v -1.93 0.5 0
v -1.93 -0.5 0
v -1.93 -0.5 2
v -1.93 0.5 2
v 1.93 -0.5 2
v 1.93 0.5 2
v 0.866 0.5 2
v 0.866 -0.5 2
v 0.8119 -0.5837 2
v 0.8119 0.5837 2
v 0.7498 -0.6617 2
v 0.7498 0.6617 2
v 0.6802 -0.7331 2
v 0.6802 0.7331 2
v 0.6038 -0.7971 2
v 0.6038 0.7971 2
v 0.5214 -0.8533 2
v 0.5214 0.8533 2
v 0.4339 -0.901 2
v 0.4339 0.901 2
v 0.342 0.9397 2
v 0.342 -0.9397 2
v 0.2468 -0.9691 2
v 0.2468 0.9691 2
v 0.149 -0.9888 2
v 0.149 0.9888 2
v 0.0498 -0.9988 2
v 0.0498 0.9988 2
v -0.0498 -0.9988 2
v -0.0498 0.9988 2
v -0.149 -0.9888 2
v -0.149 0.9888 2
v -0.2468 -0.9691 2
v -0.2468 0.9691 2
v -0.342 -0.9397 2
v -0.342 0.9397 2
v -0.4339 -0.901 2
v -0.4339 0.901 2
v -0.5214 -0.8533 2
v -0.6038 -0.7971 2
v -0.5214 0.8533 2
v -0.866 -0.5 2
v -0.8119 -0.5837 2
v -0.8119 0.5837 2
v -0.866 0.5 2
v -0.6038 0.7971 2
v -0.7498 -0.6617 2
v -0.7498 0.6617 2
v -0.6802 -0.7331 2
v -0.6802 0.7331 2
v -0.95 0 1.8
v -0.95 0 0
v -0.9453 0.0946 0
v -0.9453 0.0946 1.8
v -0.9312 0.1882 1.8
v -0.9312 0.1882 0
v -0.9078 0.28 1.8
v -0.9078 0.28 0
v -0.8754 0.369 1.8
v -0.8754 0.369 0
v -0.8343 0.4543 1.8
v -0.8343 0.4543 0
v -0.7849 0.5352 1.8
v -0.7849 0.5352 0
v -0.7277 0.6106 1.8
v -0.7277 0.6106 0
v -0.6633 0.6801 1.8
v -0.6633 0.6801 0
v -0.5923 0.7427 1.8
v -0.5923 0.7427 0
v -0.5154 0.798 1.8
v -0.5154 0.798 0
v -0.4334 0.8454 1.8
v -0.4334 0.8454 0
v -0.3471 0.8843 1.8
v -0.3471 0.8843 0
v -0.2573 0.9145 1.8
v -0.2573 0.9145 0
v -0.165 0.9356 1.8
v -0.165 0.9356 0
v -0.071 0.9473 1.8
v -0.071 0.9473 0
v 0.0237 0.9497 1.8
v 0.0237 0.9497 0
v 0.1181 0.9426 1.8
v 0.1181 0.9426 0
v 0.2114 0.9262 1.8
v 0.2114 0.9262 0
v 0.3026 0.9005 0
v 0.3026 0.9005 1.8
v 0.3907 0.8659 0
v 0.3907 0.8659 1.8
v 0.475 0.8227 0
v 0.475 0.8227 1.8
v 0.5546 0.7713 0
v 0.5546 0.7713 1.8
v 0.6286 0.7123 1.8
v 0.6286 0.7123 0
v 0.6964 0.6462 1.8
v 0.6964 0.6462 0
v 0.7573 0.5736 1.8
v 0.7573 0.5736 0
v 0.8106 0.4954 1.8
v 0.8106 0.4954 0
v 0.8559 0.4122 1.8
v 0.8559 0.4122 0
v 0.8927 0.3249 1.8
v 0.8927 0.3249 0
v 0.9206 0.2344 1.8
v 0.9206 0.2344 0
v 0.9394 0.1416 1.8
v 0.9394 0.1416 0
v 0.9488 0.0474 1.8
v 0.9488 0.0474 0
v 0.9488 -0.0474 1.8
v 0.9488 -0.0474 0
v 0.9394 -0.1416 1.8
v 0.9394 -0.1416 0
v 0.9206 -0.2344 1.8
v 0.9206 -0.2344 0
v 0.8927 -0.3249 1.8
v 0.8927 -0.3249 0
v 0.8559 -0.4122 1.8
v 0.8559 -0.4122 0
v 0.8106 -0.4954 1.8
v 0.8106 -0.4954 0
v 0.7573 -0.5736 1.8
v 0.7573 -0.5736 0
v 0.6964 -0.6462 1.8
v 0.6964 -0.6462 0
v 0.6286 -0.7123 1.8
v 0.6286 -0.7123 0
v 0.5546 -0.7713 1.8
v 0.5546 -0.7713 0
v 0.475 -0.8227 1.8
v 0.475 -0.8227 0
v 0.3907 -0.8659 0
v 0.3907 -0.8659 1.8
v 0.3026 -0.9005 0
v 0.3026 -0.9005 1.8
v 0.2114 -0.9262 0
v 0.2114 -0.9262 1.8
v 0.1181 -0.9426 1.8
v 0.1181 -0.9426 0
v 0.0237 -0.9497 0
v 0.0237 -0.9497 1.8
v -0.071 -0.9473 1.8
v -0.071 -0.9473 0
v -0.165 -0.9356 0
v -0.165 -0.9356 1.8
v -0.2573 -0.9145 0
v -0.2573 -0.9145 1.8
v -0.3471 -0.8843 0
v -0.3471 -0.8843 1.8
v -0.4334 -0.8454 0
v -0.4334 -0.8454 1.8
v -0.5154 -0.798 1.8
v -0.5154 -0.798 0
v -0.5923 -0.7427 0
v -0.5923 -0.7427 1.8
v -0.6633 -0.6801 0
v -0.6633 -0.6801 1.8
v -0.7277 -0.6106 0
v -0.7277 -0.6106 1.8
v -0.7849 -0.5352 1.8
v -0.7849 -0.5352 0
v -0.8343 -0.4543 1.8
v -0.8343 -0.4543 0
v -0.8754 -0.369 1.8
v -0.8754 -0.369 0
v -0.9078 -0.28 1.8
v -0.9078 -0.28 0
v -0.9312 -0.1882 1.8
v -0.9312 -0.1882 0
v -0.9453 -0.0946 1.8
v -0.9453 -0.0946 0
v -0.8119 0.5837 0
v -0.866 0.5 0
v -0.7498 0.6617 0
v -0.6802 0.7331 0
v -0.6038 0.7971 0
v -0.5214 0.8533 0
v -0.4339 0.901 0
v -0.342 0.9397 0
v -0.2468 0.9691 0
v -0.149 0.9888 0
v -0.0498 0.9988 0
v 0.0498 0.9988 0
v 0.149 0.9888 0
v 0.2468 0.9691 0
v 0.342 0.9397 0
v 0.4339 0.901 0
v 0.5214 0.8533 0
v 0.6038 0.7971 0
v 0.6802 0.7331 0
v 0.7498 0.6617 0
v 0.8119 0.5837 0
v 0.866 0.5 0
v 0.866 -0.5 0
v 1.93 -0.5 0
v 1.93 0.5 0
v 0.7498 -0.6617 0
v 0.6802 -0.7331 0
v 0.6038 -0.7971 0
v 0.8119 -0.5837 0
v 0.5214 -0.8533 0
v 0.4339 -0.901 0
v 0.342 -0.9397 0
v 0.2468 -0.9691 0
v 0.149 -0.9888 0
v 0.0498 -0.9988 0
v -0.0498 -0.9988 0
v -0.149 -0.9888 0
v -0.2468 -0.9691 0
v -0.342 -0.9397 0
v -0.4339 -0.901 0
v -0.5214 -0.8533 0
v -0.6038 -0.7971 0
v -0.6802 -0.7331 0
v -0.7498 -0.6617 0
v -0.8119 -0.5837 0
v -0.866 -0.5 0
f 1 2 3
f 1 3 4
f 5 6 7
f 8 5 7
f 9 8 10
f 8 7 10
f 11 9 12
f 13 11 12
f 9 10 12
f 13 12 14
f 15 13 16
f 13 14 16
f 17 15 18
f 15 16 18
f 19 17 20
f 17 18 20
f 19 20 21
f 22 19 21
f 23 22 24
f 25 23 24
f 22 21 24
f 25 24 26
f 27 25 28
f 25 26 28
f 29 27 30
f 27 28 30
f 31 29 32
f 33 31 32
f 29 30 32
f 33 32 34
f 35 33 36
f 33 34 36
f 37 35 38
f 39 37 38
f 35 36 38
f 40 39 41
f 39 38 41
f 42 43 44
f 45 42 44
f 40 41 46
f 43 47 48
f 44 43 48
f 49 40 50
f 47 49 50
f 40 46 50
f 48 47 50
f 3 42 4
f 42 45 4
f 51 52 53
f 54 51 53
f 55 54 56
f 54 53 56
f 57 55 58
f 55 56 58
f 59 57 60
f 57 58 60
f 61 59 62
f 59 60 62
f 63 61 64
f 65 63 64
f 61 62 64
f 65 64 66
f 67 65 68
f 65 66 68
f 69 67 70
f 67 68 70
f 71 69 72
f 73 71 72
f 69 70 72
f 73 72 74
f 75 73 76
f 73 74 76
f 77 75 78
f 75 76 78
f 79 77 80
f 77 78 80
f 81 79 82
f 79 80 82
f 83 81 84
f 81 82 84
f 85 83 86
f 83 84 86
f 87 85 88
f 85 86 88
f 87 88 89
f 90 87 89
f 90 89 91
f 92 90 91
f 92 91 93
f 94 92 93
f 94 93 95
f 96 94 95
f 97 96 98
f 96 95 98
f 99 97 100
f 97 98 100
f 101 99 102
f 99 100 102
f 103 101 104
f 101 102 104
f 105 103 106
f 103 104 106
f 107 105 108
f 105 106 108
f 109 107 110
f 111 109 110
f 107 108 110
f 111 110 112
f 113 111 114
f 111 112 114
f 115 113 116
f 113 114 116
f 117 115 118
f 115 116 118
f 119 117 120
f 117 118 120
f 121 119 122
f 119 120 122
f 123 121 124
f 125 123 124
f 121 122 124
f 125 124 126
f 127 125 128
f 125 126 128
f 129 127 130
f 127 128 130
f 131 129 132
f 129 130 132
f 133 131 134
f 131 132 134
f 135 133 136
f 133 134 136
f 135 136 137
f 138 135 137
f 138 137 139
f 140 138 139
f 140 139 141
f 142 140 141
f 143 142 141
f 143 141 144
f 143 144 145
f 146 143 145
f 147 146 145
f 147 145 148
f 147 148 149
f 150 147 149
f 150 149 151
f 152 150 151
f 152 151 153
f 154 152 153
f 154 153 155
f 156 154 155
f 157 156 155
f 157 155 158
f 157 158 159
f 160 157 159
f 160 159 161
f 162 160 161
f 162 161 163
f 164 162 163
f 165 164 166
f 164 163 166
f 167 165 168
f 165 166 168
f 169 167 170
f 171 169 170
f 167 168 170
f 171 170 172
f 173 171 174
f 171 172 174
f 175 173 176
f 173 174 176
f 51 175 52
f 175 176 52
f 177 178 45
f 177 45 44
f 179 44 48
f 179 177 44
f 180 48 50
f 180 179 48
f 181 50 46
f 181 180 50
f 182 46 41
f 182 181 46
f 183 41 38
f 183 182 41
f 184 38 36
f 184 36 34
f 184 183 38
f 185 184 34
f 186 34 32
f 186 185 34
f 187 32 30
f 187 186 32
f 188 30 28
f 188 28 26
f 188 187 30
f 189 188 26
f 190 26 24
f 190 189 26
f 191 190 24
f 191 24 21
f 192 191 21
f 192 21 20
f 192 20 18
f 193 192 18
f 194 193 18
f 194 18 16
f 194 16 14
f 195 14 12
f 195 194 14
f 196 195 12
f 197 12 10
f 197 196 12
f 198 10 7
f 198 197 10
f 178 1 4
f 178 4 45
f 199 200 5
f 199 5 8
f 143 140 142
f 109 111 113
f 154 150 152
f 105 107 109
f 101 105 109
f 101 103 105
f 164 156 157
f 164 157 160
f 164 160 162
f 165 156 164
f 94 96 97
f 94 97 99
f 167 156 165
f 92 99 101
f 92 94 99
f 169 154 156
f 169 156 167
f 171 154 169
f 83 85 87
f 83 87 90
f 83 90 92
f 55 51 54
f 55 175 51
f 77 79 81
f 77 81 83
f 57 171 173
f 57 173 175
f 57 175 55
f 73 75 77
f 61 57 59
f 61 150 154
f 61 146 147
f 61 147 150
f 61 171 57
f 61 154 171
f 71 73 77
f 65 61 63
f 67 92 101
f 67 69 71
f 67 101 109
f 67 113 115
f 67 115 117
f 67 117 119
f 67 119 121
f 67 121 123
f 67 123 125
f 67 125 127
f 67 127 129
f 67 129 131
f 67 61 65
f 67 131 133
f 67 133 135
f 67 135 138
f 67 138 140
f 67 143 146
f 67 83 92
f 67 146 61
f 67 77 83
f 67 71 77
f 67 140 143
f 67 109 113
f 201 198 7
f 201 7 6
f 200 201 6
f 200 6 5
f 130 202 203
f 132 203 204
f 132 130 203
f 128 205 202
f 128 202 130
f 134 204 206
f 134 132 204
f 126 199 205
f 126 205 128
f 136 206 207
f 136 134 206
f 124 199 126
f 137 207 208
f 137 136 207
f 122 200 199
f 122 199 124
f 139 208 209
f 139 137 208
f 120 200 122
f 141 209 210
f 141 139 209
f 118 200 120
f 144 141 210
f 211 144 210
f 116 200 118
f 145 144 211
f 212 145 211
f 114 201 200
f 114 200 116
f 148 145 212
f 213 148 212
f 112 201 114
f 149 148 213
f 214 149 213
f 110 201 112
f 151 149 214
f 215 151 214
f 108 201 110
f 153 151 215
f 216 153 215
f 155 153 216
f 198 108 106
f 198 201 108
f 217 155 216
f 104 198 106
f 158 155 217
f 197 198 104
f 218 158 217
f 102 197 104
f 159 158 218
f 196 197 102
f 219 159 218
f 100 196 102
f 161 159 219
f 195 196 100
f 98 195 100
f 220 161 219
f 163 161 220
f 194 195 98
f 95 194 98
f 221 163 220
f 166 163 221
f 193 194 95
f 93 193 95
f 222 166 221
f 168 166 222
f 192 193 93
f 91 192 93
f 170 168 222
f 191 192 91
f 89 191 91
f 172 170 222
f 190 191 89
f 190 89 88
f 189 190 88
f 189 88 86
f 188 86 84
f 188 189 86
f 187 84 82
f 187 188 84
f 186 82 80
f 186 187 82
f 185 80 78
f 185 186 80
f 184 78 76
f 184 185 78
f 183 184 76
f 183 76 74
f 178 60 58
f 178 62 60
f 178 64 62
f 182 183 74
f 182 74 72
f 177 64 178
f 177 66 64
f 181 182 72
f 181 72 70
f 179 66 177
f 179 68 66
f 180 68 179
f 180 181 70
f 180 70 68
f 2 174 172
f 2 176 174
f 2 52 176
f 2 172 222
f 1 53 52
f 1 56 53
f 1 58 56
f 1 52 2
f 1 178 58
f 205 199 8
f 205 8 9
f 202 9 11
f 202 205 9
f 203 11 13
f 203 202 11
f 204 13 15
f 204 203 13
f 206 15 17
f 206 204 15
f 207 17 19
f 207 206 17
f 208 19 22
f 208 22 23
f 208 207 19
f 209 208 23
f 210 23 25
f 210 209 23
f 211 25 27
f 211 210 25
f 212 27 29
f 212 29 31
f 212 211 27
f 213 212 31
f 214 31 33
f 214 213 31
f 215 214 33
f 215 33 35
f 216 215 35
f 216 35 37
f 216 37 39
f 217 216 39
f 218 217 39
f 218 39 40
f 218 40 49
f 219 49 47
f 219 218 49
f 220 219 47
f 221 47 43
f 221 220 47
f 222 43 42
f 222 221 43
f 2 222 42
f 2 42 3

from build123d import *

# Parameters (mm, degrees)
BOSS_EXTRUDE1_DEPTH = 2
SKETCH2_R           = 0.95
CUT_EXTRUDE1_DEPTH  = 1.8


with BuildPart() as part:
    # Sketch1 → Boss-Extrude1 (new body)
    with BuildSketch(Plane.XY):
        with BuildLine():
            Line((0.866025404, 0.5), (1.93, 0.5))
            Line((1.93, 0.5), (1.93, -0.5))
            Line((1.93, -0.5), (0.866025404, -0.5))
            ThreePointArc((0.866025404, -0.5), (0, -1), (-0.866025404, -0.5))
            Line((-0.866025404, -0.5), (-1.93, -0.5))
            Line((-1.93, -0.5), (-1.93, 0.5))
            Line((-1.93, 0.5), (-0.866025404, 0.5))
            ThreePointArc((-0.866025404, 0.5), (0, 1), (0.866025404, 0.5))
        make_face()
    extrude(amount=BOSS_EXTRUDE1_DEPTH)

    # Sketch2 → Cut-Extrude1 (cut)
    with BuildSketch(Plane(origin=(0, 0, 0), x_dir=(-1, 0, 0), z_dir=(0, 0, -1))):
        Circle(SKETCH2_R)
    extrude(amount=-CUT_EXTRUDE1_DEPTH, mode=Mode.SUBTRACT)


solid = part.part
